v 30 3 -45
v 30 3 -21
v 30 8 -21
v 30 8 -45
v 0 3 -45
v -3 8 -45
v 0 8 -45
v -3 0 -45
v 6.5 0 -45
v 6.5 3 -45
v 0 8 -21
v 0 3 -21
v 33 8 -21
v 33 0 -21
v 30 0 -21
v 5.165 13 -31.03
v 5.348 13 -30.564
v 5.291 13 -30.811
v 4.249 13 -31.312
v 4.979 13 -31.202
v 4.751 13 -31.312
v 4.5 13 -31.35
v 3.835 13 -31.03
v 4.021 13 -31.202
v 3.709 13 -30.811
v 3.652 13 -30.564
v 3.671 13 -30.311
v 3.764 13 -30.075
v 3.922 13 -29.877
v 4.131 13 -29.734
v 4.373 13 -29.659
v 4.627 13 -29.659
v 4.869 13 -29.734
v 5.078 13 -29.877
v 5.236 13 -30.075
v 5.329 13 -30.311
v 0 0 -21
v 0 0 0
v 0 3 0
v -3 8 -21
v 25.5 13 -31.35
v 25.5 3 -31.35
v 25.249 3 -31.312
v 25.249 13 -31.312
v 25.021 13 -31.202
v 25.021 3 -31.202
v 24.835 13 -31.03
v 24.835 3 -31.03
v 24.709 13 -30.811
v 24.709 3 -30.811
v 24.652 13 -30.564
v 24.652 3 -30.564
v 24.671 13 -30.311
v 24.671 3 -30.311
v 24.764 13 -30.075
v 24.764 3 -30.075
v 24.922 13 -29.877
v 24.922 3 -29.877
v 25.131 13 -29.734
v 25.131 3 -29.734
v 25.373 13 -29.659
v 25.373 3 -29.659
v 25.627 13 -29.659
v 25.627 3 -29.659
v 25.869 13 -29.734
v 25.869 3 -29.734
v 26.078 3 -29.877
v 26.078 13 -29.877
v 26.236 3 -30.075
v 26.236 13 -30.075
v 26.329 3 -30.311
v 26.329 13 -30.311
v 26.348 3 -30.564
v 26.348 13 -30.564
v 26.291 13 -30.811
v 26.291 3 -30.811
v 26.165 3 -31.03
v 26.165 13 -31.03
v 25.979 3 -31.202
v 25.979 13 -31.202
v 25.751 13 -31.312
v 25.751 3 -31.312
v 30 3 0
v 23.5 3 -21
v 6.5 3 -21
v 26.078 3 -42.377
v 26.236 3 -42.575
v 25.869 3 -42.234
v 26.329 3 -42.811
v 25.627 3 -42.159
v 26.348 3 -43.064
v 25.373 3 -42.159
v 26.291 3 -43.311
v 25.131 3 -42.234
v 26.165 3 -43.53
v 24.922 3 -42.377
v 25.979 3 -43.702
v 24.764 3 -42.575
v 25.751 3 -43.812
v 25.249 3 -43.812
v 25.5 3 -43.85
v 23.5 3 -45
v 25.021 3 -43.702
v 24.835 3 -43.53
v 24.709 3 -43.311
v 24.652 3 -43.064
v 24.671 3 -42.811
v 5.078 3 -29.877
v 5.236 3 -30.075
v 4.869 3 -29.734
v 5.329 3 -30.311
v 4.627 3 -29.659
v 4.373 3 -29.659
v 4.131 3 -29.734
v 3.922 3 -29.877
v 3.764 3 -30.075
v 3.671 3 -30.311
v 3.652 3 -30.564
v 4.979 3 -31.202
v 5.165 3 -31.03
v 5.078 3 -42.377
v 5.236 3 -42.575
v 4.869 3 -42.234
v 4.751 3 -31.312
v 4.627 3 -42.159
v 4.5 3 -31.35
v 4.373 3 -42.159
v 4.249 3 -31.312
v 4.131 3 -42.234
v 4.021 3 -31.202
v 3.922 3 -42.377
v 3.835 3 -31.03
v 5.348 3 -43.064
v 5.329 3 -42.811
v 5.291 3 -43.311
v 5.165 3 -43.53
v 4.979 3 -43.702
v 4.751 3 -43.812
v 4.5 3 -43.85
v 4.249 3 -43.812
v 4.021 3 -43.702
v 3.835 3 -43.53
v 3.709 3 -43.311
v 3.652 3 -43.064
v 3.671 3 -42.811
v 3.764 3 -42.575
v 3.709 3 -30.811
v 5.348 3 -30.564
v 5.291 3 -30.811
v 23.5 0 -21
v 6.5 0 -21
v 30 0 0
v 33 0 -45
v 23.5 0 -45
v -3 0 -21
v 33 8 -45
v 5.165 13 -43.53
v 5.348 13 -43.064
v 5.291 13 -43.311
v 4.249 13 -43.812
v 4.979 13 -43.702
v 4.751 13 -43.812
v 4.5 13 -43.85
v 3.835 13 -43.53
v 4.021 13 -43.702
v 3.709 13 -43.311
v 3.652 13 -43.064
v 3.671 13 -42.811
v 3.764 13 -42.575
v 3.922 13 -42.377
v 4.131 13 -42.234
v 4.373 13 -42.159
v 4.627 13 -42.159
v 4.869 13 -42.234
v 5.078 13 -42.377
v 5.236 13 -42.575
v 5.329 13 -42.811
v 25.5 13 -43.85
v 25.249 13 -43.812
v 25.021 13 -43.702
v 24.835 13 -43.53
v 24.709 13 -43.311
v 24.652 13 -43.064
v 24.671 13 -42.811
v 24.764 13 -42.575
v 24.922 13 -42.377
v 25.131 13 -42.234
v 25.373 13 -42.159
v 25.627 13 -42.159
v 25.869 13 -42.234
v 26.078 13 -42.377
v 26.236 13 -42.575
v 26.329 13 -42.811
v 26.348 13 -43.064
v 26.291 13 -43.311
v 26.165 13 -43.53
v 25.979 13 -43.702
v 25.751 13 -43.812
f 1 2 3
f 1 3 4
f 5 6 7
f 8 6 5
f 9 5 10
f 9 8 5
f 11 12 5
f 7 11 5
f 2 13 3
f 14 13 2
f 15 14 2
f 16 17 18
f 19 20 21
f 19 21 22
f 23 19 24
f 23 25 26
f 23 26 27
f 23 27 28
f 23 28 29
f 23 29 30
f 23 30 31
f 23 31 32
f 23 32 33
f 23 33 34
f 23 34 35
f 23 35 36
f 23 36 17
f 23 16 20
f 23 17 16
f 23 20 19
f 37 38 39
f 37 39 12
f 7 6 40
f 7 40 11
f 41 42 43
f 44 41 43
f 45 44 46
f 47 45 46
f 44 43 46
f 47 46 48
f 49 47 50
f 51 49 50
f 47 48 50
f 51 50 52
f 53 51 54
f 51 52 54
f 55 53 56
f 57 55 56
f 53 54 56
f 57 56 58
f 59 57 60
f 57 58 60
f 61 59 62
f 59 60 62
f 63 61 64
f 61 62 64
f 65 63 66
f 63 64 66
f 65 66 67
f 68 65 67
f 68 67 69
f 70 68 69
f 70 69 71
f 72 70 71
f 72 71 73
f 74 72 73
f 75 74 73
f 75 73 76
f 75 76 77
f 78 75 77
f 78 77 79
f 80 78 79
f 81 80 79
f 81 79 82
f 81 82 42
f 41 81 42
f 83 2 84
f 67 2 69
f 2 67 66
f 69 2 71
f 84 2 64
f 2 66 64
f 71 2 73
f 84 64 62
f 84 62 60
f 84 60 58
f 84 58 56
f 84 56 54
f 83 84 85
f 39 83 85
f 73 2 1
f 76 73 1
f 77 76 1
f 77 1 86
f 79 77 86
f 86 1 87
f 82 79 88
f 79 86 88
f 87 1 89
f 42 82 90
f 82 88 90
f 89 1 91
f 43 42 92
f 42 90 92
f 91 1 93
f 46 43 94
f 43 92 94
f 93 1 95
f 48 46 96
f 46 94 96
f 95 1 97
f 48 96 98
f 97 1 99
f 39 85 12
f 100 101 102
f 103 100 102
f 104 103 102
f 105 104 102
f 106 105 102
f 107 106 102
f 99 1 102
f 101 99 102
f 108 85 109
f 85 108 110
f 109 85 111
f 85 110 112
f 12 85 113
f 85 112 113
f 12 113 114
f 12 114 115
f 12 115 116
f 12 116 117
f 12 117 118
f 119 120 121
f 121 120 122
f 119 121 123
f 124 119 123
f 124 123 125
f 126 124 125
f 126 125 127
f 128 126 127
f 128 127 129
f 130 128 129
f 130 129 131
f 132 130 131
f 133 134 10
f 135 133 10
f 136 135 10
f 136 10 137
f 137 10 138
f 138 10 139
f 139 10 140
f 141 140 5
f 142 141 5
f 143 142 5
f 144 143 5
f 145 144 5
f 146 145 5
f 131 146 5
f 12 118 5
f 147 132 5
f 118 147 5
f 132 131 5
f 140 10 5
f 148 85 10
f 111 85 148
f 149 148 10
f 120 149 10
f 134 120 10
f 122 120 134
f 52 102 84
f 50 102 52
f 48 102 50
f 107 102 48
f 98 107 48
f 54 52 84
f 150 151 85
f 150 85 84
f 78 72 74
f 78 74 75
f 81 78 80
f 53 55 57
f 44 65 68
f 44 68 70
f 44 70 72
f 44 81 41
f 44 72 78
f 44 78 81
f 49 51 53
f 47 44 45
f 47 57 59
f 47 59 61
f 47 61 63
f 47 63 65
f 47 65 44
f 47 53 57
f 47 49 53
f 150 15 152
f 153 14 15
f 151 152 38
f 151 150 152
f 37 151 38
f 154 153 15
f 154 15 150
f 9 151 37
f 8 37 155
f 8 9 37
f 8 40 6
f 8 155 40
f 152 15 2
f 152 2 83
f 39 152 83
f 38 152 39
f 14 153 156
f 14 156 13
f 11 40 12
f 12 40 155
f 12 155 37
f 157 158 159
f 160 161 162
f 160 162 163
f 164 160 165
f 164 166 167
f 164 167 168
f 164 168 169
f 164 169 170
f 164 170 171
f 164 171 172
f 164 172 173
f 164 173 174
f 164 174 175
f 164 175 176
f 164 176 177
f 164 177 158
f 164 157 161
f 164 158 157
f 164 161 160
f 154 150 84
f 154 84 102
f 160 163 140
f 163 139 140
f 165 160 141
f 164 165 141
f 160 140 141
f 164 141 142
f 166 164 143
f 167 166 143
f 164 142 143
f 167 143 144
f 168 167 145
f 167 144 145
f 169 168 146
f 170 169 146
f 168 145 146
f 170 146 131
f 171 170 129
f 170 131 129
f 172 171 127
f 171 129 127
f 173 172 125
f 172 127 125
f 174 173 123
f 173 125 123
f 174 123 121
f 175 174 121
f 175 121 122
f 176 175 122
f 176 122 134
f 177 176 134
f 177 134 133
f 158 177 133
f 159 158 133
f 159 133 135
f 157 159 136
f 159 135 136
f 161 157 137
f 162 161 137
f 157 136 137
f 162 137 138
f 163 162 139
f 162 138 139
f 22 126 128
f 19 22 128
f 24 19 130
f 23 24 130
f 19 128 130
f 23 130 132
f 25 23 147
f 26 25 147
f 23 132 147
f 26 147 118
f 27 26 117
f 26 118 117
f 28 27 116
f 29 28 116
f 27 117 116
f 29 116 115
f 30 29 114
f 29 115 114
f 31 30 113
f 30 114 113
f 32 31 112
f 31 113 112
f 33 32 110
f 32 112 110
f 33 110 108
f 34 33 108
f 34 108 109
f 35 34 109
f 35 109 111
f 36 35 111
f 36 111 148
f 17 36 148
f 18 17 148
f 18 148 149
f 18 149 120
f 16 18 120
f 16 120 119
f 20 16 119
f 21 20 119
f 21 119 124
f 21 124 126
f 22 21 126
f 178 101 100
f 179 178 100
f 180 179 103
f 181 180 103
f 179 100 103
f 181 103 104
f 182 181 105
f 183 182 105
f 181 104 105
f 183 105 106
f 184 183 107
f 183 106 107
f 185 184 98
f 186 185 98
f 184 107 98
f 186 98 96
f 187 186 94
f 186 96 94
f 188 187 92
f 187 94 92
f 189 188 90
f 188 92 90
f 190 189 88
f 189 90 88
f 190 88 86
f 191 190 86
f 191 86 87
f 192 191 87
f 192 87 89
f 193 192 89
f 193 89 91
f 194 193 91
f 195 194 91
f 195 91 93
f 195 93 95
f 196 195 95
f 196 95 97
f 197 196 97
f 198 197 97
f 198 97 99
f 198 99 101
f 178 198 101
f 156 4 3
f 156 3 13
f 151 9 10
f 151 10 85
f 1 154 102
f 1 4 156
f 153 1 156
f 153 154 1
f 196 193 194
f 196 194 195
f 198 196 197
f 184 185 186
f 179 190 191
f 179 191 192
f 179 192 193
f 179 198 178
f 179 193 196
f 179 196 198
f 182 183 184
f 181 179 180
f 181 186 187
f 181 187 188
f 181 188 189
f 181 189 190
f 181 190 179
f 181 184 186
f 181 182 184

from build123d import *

# Parameters (mm, degrees)
BOSS_EXTRUDE1_DEPTH = 3
SKETCH2_R           = 0.85
SKETCH2_W           = 3
SKETCH2_H           = 24
BOSS_EXTRUDE2_DEPTH = 5
SKETCH3_R           = 0.85
BOSS_EXTRUDE3_DEPTH = 5


with BuildPart() as part:
    # Sketch1 → Boss-Extrude1 (new body)
    with BuildSketch(Plane(origin=(0, 0, 0), x_dir=(1, 0, 0), z_dir=(0, 1, 0))):
        Polygon((30, 0), (0, 0), (0, 21), (-3, 21), (-3, 45), (6.5, 45), (6.5, 21), (23.5, 21), (23.5, 45), (33, 45), (33, 21), (30, 21), align=None)
    extrude(amount=BOSS_EXTRUDE1_DEPTH)

    # Sketch2 → Boss-Extrude2 (add)
    with BuildSketch(Plane(origin=(0, 3, 0), x_dir=(1, 0, 0), z_dir=(0, 1, 0))):
        with Locations(Location((4.5, 43, 0), (0, 0, 90))):
            Circle(SKETCH2_R)
        with Locations(Location((25.5, 43, 0), (0, 0, 90))):
            Circle(SKETCH2_R)
        with Locations(Location((25.5, 30.5, 0), (0, 0, 90))):
            Circle(SKETCH2_R)
        with Locations(Location((4.5, 30.5, 0), (0, 0, 90))):
            Circle(SKETCH2_R)
        with Locations((-1.5, 33)):
            Rectangle(SKETCH2_W, SKETCH2_H)
        with Locations((31.5, 33)):
            Rectangle(SKETCH2_W, SKETCH2_H)
    extrude(amount=BOSS_EXTRUDE2_DEPTH)

    # Sketch3 → Boss-Extrude3 (add)
    with BuildSketch(Plane(origin=(0, 8, 0), x_dir=(1, 0, 0), z_dir=(0, 1, 0))):
        with Locations(Location((4.5, 43, 0), (0, 0, 90))):
            Circle(SKETCH3_R)
        with Locations(Location((25.5, 43, 0), (0, 0, 90))):
            Circle(SKETCH3_R)
        with Locations(Location((25.5, 30.5, 0), (0, 0, 90))):
            Circle(SKETCH3_R)
        with Locations(Location((4.5, 30.5, 0), (0, 0, 90))):
            Circle(SKETCH3_R)
    extrude(amount=BOSS_EXTRUDE3_DEPTH)


solid = part.part
